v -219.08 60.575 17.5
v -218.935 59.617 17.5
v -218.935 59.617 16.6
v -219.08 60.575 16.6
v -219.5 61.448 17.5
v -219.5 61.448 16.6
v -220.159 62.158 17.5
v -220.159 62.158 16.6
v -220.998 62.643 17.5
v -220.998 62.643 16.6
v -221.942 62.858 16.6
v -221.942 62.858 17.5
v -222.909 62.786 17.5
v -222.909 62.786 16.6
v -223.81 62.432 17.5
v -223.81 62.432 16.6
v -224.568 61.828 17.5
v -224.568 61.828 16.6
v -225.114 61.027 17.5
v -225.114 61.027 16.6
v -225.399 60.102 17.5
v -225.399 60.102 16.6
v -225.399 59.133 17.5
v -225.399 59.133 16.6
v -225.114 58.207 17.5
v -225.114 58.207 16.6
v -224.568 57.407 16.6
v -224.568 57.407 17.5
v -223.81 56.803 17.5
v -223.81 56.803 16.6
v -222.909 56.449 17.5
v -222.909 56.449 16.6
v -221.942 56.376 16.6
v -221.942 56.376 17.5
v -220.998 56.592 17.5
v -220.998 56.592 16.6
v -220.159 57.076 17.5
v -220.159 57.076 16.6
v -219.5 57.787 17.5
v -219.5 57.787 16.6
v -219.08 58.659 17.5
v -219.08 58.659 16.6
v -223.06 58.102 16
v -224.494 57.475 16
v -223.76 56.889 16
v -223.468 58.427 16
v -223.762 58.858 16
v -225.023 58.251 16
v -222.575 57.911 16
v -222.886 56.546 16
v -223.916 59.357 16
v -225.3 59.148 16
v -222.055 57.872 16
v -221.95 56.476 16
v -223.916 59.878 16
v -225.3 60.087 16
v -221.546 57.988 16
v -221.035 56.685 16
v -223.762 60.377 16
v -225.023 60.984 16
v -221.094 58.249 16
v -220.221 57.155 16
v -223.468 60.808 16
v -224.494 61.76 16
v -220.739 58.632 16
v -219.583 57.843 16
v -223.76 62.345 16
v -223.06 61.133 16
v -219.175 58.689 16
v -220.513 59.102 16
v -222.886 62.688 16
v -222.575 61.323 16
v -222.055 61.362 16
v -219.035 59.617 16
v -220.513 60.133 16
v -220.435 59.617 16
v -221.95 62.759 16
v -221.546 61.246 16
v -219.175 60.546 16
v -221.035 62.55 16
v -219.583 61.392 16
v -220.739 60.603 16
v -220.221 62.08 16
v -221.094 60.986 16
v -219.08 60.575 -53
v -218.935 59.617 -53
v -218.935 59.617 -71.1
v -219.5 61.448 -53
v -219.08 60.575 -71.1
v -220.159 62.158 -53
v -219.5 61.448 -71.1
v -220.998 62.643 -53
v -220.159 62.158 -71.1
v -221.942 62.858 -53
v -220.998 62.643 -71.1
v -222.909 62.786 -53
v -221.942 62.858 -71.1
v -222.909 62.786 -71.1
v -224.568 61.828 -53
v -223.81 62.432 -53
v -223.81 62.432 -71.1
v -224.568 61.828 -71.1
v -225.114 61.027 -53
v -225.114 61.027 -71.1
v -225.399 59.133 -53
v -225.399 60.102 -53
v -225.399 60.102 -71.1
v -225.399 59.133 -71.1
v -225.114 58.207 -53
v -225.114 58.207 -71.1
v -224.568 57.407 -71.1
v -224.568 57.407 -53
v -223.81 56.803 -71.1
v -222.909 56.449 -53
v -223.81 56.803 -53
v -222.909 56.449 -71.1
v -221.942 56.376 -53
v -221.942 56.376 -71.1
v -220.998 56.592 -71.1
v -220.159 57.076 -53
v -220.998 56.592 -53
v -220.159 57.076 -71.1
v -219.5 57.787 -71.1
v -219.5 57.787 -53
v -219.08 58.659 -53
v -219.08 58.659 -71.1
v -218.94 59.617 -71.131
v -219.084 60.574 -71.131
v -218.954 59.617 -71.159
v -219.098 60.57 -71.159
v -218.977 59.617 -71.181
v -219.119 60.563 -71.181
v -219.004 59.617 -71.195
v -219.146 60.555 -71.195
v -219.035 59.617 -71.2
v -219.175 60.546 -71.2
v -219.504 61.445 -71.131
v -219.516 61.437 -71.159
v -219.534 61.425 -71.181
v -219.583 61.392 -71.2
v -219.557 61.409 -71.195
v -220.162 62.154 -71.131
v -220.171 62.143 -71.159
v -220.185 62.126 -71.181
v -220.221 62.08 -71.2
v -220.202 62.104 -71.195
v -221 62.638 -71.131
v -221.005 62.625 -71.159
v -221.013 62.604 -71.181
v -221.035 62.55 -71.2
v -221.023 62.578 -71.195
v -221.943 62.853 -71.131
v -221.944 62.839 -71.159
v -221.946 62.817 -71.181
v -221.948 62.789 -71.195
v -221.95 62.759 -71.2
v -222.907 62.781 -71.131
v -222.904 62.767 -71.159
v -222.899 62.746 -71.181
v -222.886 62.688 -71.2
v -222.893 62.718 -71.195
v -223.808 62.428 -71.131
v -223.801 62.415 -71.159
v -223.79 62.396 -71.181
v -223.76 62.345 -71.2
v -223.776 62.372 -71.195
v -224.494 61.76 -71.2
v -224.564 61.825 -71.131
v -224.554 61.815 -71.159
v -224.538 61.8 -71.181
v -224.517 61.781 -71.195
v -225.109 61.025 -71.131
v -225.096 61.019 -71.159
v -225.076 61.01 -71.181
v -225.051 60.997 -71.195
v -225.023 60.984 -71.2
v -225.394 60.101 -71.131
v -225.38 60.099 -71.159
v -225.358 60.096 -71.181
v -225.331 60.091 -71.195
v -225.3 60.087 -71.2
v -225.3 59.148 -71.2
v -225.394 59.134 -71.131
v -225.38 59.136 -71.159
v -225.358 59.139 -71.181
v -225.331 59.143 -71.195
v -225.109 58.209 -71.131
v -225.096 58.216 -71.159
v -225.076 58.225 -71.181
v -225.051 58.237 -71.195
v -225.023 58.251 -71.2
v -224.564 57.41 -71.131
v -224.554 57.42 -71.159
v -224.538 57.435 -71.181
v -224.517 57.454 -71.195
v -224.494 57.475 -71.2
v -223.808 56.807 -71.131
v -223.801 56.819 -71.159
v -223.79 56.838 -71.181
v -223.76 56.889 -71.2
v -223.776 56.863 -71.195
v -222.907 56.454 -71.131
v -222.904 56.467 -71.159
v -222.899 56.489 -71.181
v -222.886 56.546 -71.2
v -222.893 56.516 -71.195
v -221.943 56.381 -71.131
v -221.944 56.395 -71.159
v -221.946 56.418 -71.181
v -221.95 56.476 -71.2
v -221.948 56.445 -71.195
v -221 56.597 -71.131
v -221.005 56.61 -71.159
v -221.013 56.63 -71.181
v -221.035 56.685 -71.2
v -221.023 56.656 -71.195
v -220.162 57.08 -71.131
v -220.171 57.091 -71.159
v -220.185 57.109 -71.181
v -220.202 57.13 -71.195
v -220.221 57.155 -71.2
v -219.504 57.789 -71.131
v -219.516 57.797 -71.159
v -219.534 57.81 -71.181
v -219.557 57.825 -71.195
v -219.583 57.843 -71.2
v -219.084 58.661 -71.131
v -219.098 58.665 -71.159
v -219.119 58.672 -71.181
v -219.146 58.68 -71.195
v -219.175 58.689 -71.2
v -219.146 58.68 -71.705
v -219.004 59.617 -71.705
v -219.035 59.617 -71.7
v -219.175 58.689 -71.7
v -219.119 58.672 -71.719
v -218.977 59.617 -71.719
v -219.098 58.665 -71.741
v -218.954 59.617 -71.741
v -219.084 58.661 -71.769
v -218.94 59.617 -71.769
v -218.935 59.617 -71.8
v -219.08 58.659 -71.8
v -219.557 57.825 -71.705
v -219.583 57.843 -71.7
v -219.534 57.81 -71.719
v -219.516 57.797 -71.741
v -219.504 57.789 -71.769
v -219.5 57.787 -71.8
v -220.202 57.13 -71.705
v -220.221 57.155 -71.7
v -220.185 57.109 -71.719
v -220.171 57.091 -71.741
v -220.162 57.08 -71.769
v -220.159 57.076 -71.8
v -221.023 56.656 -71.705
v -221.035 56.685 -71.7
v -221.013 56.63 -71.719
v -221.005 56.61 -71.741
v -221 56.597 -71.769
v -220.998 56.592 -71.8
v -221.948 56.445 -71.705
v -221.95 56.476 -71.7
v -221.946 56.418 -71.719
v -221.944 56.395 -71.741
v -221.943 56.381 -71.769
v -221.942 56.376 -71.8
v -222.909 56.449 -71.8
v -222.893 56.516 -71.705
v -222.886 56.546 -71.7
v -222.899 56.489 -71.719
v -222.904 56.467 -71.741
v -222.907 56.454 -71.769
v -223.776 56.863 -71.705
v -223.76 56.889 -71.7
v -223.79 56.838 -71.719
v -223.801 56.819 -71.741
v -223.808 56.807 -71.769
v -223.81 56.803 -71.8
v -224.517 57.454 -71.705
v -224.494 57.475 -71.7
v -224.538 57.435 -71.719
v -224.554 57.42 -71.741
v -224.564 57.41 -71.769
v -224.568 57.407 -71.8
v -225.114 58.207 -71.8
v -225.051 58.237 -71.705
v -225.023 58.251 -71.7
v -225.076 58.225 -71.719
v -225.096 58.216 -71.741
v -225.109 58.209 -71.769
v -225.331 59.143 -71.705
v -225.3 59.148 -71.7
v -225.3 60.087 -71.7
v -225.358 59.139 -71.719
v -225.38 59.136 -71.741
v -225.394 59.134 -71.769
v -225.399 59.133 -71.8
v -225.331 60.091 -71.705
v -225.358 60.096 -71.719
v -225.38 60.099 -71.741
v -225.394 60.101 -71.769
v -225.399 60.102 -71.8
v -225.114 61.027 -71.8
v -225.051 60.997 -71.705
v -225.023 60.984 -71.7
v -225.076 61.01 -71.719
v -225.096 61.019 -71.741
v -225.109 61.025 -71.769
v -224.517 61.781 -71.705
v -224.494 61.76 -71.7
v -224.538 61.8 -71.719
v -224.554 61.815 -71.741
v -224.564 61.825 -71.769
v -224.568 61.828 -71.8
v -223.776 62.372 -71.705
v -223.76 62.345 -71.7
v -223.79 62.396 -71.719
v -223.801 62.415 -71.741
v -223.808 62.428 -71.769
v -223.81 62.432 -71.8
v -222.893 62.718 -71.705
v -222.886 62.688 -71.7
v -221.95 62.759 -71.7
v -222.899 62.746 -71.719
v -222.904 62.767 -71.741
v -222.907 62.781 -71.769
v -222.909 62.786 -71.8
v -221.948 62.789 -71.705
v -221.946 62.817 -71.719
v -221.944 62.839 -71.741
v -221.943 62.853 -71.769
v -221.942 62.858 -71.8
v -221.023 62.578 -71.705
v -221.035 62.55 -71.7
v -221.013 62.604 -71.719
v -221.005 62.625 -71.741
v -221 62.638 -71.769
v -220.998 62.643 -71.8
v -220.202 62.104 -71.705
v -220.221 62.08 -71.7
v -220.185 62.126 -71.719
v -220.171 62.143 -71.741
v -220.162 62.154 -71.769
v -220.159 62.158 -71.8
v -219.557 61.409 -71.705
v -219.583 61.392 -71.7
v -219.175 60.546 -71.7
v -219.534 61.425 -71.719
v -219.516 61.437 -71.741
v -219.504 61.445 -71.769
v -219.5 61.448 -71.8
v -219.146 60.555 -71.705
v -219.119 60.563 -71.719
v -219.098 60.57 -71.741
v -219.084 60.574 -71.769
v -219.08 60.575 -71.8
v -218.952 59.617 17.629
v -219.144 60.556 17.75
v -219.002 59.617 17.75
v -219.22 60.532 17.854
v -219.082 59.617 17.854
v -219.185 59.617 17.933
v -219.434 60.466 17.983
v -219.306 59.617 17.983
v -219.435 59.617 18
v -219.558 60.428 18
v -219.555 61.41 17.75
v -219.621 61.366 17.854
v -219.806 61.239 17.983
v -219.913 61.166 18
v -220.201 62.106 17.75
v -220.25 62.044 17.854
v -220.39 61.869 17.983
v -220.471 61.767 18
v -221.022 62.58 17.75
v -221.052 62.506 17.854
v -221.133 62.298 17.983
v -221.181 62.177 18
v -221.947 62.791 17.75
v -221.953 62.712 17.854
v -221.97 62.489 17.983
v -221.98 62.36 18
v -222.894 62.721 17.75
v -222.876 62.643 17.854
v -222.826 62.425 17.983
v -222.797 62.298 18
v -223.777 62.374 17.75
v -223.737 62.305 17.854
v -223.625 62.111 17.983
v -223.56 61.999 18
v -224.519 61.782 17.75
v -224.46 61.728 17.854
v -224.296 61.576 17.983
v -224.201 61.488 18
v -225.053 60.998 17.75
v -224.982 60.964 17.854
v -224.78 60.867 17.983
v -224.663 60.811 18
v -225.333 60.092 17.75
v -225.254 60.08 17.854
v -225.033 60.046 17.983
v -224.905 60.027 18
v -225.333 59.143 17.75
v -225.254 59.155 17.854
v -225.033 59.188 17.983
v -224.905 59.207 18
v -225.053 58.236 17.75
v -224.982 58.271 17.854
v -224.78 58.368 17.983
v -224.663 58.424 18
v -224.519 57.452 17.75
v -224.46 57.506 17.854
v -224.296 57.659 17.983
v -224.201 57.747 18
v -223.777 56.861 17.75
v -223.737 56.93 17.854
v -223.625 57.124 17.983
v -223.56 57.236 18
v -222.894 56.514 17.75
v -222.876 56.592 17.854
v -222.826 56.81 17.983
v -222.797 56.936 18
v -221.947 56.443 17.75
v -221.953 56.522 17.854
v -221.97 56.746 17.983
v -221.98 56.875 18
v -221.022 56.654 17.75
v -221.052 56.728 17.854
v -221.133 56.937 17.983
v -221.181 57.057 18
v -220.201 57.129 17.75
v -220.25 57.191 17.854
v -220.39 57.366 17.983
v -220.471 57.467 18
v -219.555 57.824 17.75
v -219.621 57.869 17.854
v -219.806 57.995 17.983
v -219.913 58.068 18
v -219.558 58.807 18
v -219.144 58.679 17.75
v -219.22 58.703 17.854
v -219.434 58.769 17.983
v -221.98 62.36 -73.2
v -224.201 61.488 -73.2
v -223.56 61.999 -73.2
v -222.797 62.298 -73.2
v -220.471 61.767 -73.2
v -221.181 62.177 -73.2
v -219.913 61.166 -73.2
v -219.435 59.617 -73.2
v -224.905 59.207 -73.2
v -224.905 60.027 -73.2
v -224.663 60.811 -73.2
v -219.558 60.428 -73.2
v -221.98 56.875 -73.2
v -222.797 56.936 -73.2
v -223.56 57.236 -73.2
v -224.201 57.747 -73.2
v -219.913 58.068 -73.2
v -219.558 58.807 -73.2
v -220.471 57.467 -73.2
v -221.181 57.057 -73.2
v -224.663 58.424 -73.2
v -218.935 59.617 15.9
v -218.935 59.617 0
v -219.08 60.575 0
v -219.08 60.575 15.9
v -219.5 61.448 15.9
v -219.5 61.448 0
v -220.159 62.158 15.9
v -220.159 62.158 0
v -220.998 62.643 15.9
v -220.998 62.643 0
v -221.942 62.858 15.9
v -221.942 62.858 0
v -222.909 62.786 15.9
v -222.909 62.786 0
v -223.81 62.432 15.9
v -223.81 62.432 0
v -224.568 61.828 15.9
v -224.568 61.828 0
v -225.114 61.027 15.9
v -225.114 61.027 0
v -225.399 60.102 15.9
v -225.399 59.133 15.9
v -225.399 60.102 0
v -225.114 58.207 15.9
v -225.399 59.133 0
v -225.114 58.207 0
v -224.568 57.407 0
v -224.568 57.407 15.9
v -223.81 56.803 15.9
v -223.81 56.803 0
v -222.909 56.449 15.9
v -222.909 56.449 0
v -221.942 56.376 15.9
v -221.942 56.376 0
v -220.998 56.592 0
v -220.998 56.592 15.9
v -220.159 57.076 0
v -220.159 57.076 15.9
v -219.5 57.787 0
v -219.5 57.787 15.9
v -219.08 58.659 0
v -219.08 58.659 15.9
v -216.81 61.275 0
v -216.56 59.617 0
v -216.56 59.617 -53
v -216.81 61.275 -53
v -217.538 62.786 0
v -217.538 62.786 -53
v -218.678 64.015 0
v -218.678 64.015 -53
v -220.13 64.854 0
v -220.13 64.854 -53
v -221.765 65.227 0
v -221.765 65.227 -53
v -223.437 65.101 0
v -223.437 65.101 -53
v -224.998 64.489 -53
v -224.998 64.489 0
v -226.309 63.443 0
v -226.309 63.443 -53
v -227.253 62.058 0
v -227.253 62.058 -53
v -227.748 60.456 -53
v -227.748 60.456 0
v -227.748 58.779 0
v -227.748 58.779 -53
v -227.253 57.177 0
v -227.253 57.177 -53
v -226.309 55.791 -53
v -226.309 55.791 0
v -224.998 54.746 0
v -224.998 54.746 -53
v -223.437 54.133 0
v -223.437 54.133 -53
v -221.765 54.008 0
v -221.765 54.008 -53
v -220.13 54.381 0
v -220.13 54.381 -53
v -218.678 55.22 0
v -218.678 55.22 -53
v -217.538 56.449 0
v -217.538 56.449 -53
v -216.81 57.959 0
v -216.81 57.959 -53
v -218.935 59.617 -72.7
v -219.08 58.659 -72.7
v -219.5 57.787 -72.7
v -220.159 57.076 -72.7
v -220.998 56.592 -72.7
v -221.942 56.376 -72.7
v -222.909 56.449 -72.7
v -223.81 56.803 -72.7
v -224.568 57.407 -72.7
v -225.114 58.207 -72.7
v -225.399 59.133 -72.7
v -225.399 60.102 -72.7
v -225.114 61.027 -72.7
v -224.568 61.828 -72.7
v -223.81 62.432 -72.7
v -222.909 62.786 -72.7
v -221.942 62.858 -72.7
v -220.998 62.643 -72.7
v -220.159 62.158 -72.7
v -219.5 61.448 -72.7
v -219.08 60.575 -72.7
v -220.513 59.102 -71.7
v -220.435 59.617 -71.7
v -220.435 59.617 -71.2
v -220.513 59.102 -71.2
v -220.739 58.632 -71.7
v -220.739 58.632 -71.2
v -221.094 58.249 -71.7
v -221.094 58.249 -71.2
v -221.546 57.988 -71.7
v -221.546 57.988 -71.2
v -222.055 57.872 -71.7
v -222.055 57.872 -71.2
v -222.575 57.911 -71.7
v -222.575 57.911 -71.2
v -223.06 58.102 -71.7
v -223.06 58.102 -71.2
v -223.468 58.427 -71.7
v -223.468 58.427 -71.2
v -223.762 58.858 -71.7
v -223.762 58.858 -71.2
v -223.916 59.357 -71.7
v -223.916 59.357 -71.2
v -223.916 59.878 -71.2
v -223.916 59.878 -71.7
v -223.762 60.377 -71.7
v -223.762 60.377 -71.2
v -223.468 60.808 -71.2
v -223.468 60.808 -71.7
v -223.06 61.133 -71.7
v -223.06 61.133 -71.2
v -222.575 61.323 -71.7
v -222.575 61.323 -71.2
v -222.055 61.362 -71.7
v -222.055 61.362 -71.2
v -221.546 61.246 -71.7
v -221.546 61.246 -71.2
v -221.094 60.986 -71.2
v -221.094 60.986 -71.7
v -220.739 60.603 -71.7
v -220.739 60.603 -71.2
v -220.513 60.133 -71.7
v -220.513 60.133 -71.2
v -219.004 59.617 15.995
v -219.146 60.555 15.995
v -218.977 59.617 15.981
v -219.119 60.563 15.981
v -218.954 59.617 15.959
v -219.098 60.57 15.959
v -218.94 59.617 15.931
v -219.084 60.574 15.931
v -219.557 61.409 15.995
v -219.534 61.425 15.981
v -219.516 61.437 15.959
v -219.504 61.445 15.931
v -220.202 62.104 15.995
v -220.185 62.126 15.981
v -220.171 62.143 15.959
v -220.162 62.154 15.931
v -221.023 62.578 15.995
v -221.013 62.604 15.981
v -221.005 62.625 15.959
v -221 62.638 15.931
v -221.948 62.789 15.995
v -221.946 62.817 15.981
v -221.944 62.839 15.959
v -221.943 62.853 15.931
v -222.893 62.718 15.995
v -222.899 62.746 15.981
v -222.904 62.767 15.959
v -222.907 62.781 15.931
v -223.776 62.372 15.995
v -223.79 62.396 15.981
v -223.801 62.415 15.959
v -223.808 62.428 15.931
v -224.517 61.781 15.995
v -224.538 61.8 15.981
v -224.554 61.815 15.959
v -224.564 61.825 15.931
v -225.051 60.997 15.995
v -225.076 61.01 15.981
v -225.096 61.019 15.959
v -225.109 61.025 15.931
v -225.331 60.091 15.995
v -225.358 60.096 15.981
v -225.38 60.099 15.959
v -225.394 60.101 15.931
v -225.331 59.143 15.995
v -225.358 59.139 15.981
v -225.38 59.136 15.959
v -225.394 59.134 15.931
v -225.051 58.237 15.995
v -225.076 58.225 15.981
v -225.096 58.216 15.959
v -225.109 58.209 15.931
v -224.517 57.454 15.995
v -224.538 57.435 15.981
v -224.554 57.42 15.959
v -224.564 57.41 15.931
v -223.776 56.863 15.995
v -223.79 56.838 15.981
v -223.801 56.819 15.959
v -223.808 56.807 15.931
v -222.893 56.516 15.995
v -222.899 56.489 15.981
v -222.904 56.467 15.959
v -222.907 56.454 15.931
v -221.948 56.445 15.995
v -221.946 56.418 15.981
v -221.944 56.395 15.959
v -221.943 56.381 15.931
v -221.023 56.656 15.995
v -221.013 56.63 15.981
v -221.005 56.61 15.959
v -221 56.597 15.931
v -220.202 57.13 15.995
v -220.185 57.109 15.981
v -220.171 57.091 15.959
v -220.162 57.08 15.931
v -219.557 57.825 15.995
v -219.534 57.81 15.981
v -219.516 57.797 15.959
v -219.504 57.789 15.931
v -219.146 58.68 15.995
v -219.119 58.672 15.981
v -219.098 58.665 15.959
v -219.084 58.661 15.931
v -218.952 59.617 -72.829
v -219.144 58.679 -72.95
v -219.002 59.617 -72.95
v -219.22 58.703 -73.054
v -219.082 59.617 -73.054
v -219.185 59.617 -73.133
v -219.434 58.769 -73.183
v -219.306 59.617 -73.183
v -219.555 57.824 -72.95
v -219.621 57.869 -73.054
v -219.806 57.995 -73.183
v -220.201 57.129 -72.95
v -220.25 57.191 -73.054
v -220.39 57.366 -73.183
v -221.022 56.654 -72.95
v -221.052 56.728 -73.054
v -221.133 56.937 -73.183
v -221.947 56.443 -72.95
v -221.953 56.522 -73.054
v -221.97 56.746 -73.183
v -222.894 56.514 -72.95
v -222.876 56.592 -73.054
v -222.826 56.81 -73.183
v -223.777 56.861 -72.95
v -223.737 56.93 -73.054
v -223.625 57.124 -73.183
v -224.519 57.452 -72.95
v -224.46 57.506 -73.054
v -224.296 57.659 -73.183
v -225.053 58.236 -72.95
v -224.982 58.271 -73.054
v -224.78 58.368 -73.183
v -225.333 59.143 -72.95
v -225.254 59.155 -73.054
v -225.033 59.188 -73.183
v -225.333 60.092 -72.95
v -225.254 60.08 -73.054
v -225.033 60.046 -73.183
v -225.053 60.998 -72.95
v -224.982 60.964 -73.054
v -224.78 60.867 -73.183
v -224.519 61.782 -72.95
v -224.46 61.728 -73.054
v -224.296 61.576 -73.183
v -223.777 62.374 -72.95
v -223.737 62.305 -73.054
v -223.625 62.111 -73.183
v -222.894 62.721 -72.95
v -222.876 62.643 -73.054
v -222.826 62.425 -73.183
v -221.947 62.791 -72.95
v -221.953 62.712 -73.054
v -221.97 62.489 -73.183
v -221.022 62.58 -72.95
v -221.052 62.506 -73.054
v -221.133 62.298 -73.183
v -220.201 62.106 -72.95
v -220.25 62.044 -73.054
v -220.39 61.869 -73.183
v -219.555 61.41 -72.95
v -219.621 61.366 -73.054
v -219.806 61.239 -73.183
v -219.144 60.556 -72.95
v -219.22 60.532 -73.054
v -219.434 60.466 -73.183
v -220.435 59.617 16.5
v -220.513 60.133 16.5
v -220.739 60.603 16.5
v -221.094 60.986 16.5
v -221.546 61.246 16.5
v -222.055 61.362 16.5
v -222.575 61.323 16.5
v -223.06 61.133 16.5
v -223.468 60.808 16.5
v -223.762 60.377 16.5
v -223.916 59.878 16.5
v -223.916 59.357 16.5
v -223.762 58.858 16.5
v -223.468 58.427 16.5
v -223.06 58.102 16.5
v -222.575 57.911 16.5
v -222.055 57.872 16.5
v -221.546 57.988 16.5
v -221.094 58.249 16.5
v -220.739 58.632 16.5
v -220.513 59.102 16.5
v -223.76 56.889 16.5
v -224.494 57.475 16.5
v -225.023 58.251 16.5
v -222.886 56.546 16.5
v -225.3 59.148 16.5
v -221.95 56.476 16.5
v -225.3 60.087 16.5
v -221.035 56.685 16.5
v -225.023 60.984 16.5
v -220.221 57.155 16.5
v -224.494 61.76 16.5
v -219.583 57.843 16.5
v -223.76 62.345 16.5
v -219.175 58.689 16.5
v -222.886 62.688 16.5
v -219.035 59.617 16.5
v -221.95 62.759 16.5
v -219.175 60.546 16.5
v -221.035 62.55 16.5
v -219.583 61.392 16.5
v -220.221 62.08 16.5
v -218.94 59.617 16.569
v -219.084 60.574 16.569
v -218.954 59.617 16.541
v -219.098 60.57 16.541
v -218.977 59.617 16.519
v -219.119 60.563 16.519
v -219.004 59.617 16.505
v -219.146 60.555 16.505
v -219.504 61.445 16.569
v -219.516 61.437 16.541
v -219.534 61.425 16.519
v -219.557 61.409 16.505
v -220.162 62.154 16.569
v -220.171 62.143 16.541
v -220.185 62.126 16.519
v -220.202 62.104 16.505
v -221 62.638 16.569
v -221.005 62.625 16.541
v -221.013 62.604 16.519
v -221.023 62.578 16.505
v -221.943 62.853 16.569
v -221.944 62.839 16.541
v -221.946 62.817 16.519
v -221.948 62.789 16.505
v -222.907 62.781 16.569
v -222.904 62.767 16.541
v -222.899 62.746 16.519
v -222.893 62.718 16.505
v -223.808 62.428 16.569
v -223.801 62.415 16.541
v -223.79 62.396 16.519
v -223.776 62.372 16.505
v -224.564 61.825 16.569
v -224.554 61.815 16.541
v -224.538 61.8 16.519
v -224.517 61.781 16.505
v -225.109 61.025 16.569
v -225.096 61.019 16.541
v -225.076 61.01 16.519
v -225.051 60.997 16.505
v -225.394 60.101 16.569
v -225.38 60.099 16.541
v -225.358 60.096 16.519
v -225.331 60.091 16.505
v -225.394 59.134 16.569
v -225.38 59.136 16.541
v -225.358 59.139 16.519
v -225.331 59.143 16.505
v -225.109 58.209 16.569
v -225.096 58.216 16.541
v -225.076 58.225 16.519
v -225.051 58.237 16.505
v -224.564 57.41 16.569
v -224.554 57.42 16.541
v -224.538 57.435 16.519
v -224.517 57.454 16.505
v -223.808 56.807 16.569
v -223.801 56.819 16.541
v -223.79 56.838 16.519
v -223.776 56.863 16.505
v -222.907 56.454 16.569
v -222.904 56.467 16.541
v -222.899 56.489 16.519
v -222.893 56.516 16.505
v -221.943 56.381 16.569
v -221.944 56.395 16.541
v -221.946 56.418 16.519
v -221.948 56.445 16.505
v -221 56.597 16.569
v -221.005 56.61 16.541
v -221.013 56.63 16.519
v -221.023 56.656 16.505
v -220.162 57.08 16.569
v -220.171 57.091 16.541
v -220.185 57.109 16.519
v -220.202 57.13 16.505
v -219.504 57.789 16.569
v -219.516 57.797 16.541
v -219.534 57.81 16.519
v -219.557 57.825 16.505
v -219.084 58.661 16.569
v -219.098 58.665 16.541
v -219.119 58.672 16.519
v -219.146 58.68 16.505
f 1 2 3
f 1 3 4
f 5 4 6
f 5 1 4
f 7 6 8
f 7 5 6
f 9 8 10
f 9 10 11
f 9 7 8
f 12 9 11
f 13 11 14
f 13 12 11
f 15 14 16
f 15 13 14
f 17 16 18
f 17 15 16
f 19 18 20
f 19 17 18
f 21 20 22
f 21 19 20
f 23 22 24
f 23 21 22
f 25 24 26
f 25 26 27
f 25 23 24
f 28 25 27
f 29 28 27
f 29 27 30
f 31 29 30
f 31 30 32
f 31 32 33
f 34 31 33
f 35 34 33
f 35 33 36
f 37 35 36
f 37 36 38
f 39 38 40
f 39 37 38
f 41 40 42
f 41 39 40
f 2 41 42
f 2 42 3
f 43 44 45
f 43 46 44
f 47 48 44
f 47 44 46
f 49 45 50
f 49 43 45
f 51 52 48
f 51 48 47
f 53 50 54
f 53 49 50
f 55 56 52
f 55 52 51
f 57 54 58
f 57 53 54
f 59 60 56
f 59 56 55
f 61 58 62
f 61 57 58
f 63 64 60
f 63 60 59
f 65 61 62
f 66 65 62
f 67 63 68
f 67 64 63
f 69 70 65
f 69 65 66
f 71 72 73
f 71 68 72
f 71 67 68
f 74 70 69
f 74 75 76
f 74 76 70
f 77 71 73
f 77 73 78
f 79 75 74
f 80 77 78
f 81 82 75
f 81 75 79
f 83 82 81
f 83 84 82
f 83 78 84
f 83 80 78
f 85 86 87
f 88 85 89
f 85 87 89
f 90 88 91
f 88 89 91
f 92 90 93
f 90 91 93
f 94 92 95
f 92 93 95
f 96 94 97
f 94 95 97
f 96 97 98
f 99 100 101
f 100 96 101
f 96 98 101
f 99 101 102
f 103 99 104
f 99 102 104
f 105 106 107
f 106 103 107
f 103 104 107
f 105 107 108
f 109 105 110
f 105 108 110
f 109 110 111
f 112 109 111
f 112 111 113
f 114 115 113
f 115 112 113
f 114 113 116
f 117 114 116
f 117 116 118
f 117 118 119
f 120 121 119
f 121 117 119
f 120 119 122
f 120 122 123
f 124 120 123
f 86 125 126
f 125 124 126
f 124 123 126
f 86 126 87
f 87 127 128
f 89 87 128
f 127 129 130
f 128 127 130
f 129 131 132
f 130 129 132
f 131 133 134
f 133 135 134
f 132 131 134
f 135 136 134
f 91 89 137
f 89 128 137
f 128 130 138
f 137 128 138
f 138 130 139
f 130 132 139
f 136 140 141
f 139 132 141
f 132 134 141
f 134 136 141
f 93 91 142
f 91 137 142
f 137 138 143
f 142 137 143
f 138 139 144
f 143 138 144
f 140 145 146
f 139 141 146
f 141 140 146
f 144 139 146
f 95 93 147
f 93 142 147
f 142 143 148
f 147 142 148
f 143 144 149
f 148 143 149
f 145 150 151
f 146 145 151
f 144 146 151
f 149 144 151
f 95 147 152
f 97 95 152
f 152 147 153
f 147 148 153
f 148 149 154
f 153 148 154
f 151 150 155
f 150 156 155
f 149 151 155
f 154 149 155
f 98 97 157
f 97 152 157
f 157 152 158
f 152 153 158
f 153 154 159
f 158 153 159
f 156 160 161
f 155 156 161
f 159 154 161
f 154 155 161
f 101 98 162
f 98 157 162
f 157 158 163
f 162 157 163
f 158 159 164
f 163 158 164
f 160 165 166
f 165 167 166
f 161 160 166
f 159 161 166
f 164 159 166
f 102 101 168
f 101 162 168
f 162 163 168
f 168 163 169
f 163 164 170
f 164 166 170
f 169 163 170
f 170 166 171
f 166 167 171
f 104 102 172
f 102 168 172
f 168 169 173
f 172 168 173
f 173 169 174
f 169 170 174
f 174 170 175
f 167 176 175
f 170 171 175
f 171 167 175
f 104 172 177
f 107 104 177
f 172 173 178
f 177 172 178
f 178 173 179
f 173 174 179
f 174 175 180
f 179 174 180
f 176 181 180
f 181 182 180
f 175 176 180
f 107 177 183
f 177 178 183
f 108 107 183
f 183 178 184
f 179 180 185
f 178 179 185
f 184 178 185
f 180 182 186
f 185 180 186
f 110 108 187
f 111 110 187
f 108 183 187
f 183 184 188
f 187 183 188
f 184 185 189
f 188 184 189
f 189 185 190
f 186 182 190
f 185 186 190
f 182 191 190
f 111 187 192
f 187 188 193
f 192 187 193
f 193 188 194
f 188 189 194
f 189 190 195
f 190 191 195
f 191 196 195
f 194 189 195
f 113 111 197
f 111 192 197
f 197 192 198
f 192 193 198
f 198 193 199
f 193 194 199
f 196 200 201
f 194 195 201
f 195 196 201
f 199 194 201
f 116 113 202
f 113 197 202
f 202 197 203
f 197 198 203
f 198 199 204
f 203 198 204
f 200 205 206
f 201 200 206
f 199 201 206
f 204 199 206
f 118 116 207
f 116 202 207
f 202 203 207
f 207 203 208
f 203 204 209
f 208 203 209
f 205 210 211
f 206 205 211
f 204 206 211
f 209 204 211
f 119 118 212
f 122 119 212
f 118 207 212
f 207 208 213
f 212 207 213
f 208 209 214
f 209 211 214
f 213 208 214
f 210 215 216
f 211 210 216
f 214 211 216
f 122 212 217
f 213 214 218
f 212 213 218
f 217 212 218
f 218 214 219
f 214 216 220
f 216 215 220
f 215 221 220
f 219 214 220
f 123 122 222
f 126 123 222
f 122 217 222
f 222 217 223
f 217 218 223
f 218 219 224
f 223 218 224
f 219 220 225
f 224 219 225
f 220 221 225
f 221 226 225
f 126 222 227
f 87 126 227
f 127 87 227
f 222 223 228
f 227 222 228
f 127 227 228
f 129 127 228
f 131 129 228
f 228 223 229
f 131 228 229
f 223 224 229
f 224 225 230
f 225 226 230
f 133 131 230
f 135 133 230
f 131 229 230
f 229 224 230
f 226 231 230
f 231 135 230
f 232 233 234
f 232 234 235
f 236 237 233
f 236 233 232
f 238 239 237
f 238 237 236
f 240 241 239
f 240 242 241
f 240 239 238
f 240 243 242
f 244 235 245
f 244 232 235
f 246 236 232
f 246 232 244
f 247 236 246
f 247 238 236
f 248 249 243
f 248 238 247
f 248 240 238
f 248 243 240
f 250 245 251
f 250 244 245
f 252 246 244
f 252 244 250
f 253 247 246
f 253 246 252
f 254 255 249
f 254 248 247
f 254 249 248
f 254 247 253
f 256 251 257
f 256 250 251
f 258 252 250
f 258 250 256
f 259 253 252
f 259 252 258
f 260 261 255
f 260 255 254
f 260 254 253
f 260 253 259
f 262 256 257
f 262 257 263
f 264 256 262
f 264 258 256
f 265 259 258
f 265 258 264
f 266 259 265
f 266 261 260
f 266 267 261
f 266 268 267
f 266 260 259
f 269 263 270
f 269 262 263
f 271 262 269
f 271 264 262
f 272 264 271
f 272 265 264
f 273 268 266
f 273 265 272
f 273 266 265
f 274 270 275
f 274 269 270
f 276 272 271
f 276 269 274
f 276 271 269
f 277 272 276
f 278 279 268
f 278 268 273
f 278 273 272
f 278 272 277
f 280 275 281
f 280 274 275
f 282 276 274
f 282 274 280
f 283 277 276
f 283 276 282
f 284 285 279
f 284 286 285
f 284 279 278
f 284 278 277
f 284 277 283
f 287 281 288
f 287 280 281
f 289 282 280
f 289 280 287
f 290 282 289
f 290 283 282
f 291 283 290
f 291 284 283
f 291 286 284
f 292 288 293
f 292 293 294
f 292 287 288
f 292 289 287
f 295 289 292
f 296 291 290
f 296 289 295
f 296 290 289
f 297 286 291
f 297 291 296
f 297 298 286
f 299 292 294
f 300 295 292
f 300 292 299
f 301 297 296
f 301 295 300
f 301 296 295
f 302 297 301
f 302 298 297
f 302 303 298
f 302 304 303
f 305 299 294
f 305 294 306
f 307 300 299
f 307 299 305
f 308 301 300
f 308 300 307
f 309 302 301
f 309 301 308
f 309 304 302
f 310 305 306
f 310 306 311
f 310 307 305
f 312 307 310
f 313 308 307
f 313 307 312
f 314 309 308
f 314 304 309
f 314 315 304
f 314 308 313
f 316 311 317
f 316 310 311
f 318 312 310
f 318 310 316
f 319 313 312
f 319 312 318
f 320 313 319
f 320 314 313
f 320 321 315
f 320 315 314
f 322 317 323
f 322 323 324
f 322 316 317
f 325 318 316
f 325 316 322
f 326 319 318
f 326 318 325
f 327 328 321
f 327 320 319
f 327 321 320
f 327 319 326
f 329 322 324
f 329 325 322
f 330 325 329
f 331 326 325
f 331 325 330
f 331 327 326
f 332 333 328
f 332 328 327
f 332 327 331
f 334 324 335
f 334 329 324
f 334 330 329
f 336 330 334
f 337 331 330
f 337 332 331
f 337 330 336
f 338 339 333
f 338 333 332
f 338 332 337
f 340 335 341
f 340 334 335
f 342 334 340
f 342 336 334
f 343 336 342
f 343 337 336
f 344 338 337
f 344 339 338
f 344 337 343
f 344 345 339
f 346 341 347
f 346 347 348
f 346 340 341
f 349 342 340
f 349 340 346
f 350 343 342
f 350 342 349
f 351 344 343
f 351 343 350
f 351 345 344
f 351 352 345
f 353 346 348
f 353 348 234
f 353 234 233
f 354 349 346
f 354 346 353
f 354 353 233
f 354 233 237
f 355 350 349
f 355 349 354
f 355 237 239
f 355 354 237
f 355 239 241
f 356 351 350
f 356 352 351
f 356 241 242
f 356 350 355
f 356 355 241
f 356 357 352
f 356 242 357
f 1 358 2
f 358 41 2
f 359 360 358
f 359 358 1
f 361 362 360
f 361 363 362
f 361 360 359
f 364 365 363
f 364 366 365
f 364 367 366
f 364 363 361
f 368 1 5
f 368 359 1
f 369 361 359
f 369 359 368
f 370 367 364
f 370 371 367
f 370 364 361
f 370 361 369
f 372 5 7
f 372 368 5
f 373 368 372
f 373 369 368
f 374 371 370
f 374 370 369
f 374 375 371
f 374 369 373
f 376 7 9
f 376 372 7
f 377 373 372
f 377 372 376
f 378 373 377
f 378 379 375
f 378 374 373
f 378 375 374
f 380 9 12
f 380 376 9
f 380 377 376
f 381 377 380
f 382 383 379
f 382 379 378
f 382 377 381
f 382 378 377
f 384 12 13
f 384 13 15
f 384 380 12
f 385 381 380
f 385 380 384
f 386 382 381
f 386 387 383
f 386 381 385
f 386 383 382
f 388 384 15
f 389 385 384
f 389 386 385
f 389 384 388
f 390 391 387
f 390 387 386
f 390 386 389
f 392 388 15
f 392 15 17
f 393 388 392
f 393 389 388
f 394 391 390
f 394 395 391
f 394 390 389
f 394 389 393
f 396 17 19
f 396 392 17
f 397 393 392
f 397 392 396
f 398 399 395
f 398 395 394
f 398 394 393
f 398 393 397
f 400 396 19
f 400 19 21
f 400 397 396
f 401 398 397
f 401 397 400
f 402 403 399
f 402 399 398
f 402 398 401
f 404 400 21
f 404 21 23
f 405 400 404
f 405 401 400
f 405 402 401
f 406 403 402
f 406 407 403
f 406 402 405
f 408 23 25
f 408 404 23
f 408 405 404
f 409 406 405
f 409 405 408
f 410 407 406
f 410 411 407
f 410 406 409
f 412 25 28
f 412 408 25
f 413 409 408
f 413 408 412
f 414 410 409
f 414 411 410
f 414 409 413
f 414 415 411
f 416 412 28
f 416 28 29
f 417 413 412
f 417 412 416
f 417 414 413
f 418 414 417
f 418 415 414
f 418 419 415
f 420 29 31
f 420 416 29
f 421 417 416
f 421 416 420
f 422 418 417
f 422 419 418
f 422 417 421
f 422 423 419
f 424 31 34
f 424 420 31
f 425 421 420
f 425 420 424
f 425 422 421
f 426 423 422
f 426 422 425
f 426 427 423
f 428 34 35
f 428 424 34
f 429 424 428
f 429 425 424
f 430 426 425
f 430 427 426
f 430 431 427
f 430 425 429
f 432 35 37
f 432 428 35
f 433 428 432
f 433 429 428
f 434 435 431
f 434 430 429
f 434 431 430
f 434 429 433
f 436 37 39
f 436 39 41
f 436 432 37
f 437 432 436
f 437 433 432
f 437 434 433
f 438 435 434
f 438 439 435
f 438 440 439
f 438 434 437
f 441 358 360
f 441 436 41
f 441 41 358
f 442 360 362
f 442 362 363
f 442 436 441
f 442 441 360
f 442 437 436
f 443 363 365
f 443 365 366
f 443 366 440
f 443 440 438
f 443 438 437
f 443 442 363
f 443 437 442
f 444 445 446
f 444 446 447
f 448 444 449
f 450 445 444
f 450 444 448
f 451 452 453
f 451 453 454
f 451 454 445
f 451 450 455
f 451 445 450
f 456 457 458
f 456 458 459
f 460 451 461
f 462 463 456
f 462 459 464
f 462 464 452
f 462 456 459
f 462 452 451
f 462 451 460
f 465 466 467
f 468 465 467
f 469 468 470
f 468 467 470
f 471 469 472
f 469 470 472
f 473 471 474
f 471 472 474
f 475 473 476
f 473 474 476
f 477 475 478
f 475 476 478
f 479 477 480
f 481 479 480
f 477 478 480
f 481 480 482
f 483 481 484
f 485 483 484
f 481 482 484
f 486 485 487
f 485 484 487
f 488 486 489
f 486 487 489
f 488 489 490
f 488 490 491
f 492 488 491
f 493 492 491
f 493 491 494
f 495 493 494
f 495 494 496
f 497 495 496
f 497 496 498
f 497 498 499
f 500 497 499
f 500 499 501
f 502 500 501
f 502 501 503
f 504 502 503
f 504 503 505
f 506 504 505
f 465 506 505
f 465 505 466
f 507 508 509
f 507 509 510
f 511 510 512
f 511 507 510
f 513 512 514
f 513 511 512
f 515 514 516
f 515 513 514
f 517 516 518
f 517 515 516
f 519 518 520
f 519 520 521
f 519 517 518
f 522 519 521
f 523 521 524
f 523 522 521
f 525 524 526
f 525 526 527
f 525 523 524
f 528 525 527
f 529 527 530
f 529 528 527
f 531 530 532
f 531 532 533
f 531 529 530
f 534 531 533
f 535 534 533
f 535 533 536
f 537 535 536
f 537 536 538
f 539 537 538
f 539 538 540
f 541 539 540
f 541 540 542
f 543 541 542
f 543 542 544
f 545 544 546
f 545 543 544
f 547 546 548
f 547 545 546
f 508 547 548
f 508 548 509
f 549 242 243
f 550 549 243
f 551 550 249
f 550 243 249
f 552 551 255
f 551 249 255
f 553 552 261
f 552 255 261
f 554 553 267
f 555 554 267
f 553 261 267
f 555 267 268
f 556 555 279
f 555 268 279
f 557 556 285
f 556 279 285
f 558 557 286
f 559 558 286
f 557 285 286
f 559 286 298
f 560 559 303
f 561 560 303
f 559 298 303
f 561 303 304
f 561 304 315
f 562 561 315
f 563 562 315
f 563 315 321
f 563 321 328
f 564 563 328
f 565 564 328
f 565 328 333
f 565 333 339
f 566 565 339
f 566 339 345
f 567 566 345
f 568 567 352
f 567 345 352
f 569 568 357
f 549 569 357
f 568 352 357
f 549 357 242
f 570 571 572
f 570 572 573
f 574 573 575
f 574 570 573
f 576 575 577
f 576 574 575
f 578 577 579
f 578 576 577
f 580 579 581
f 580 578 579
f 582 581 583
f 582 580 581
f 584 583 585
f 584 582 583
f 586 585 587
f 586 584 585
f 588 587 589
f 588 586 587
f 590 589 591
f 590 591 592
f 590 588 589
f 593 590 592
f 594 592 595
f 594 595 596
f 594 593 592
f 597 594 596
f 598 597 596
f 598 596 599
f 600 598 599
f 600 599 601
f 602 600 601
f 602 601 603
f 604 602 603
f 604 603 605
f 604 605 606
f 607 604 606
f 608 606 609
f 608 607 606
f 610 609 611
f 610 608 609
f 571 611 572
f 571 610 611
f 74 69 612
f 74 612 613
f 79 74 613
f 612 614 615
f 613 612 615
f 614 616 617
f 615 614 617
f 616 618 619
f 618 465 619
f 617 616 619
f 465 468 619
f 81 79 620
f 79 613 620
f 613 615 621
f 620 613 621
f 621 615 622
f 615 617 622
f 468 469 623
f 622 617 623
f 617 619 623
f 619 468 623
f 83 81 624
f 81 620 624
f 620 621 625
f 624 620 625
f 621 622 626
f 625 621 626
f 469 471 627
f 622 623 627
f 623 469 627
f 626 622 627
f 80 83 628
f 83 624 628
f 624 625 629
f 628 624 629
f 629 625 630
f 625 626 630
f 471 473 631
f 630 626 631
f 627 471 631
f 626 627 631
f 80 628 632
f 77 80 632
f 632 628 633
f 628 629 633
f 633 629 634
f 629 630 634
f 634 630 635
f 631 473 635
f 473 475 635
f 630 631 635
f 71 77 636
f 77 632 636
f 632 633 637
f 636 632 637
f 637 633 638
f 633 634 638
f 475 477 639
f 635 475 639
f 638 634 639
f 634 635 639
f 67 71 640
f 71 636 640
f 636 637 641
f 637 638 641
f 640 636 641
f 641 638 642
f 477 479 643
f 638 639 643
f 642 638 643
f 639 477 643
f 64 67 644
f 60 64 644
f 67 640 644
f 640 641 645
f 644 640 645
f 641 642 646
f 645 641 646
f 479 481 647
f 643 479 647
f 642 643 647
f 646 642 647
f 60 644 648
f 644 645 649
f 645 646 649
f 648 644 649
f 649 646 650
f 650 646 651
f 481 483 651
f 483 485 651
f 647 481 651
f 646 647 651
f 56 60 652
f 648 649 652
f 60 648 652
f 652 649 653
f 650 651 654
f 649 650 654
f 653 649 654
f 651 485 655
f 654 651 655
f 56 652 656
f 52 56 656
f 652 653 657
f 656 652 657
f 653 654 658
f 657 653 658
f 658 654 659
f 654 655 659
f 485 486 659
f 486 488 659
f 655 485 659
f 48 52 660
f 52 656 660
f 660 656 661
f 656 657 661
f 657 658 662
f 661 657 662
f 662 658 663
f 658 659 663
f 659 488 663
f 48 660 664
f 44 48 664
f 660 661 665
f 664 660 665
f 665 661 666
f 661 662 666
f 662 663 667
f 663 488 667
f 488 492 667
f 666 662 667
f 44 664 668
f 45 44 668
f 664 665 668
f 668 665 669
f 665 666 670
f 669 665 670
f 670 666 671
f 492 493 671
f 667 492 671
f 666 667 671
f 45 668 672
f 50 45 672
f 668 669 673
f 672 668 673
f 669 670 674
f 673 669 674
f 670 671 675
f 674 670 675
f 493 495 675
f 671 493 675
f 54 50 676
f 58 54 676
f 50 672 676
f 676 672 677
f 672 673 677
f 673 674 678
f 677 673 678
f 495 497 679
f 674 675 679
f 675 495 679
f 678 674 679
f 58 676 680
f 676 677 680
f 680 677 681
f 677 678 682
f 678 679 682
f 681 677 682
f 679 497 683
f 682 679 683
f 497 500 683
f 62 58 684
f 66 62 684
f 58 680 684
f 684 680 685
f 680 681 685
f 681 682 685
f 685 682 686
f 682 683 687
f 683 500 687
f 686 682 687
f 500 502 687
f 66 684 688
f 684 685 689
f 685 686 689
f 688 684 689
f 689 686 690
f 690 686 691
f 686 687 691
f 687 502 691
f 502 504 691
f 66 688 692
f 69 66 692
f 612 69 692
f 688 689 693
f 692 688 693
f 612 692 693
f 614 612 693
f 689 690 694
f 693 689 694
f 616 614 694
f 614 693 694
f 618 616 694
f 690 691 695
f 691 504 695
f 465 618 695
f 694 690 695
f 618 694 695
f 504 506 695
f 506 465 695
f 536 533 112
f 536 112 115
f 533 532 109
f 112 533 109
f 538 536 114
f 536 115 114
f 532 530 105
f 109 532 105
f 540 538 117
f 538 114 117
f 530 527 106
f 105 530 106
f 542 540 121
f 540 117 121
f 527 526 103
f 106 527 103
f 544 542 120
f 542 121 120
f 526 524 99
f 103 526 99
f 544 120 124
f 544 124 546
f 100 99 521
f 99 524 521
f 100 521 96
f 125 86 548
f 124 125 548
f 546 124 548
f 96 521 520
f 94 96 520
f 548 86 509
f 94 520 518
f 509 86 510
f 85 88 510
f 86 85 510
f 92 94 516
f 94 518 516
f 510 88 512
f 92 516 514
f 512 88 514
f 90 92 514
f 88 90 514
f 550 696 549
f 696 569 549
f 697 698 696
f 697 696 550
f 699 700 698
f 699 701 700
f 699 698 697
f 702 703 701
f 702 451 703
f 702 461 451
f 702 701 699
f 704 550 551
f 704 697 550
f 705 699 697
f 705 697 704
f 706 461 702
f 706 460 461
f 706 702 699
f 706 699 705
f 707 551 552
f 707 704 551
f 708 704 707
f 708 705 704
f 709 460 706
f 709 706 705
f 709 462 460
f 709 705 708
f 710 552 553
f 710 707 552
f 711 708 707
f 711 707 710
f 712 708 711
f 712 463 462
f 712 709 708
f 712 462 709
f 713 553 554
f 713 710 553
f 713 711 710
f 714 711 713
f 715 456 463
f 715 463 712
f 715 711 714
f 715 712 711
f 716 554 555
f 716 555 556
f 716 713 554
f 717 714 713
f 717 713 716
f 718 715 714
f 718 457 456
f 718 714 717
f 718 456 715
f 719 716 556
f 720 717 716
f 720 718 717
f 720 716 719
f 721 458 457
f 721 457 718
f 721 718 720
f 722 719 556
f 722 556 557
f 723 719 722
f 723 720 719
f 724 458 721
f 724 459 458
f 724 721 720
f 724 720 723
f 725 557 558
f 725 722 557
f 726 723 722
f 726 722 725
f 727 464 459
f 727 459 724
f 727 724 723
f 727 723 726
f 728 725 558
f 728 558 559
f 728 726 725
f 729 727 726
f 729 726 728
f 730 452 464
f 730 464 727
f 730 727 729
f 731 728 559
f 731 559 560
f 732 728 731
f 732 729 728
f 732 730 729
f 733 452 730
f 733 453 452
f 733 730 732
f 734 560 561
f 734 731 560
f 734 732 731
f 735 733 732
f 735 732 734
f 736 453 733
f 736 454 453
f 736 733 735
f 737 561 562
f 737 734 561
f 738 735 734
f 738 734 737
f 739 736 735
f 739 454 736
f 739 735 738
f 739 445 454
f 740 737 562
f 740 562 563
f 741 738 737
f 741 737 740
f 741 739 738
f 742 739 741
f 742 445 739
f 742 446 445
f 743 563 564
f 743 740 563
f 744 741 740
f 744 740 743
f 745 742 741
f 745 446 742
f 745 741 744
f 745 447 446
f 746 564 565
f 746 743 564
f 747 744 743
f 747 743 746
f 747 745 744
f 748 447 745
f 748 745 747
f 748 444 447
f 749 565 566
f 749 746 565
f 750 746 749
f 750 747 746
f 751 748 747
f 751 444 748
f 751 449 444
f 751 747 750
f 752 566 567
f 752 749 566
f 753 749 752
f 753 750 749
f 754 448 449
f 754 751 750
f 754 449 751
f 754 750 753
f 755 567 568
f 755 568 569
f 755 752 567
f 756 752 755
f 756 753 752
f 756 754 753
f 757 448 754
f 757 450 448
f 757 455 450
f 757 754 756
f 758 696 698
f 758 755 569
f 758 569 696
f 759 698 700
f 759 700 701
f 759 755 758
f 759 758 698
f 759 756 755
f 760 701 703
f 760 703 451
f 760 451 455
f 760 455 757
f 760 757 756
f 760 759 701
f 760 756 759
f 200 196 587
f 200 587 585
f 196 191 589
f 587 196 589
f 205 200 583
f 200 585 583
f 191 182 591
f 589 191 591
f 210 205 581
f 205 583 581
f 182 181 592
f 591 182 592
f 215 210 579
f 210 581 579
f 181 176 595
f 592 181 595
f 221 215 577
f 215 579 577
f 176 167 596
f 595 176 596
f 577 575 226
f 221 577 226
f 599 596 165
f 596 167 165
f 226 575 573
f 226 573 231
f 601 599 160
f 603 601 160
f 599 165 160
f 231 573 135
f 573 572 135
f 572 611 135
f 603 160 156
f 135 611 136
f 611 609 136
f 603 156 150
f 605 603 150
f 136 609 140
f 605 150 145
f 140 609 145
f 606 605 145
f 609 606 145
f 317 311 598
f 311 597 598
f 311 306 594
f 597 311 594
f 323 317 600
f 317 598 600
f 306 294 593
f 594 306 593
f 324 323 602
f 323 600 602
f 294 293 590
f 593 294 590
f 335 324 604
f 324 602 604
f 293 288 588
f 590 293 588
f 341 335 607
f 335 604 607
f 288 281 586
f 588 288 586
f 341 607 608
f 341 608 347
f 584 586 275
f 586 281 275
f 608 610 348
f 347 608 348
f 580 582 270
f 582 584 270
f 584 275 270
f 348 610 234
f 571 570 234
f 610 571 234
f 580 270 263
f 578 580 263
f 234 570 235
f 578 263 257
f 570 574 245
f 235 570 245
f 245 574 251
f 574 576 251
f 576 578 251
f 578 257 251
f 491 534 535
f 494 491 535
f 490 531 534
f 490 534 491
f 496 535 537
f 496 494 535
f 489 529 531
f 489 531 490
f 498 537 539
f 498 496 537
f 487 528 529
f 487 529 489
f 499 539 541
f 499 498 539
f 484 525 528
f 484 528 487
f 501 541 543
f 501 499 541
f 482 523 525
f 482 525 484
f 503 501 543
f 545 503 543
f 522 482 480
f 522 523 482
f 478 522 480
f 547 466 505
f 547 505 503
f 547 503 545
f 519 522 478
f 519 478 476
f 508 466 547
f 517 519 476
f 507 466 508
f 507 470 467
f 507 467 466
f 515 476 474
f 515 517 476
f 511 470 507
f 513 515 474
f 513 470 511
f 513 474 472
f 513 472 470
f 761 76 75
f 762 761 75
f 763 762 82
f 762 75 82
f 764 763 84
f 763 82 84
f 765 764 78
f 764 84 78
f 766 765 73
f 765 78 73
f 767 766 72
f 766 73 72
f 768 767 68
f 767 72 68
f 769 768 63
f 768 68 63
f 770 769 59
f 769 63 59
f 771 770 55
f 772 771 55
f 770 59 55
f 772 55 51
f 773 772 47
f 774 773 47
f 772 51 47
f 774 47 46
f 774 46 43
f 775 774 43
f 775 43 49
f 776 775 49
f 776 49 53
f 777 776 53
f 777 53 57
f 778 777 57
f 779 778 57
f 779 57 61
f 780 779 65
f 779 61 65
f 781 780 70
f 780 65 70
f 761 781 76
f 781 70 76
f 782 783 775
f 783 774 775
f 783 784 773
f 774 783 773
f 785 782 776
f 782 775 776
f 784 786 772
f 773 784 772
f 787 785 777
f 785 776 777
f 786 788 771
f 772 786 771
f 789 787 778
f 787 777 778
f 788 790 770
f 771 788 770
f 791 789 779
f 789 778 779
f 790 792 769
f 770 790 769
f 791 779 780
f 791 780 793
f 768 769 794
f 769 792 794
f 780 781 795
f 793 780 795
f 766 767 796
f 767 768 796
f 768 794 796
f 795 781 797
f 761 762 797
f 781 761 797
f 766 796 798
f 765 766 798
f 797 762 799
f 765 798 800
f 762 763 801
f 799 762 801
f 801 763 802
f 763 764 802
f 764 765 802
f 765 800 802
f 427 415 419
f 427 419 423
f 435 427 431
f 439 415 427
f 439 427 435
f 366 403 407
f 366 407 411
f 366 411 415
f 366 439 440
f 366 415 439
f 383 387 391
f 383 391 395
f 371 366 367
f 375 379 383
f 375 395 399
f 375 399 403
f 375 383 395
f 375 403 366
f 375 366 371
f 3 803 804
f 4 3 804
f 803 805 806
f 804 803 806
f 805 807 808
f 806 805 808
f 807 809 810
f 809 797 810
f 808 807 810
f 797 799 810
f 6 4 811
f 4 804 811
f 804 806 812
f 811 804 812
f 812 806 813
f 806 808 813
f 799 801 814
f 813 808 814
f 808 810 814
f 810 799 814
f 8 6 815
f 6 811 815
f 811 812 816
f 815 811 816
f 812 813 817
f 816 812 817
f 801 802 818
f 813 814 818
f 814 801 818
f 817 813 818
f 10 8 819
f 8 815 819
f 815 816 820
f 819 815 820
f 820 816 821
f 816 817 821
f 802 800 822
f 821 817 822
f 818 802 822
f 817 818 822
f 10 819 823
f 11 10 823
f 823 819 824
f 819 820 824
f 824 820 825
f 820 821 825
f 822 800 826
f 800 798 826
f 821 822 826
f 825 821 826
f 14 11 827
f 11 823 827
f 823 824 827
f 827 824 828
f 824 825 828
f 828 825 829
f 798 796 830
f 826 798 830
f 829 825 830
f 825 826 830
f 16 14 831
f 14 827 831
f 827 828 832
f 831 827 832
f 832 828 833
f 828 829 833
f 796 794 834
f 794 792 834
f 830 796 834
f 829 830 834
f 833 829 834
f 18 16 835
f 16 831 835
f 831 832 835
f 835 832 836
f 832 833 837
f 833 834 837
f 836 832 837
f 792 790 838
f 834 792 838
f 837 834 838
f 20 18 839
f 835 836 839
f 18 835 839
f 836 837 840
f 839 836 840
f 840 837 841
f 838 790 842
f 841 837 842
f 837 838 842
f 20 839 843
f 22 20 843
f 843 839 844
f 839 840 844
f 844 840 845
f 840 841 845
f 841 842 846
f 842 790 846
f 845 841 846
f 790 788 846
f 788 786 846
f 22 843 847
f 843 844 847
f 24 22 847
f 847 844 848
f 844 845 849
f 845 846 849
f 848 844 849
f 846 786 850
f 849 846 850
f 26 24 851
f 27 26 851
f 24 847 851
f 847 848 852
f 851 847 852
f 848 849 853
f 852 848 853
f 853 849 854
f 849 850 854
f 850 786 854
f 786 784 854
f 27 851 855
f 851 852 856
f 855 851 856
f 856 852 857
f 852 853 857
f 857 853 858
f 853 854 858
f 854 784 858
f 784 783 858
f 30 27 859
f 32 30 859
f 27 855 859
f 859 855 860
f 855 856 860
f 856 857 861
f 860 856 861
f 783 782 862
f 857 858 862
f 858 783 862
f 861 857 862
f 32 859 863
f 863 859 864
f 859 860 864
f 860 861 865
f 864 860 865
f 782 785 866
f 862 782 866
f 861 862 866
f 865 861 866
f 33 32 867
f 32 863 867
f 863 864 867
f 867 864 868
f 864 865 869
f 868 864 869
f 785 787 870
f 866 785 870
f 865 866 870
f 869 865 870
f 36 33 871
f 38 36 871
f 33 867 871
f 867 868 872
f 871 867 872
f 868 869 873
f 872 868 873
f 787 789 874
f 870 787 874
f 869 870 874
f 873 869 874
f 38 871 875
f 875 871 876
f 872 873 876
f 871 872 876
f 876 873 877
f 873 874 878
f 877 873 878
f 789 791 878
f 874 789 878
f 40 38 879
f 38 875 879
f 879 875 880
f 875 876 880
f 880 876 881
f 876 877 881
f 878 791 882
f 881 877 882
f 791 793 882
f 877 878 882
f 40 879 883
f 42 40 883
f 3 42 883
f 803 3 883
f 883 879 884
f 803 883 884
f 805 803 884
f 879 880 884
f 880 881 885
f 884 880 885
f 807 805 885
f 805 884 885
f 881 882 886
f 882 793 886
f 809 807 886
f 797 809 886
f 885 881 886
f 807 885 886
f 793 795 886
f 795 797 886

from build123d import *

# Parameters (mm, degrees)
SKETCH1_R                = 5.625
BOSS_EXTRUDE1_DEPTH      = 53
BOSS_EXTRUDE2_DEPTH      = 16
BOSS_EXTRUDE2_DEPTH_BACK = 71.2
SKETCH2_R                = 3.25
SKETCH3_R                = 1.75
BOSS_EXTRUDE3_DEPTH      = 0.5
BOSS_EXTRUDE4_START      = 0.5
SKETCH4_R                = 1.75
BOSS_EXTRUDE4_DEPTH      = 0.5
SKETCH5_R                = 3.25
BOSS_EXTRUDE5_DEPTH      = 1.5
BOSS_EXTRUDE6_START      = 1.5
SKETCH6_R                = 3.25
BOSS_EXTRUDE6_DEPTH      = 1.5
FILLET1_R                = 0.1
FILLET2_R                = 0.5


with BuildPart() as part:
    # Sketch1 → Boss-Extrude1 (new body)
    with BuildSketch(Plane.XY):
        with Locations((-222.185360959, 59.617346216)):
            Circle(SKETCH1_R)
    extrude(amount=-BOSS_EXTRUDE1_DEPTH)

    # Sketch2 → Boss-Extrude2 (add, two sides: drawn at the far end of the back side and taken through both)
    with BuildSketch(Plane.XY.offset(-BOSS_EXTRUDE2_DEPTH_BACK)):
        with Locations((-222.185360959, 59.617346216)):
            Circle(SKETCH2_R)
    extrude(amount=BOSS_EXTRUDE2_DEPTH + BOSS_EXTRUDE2_DEPTH_BACK)

    # Sketch3 → Boss-Extrude3 (add)
    with BuildSketch(Plane.XY.offset(16)):
        with Locations((-222.185360959, 59.617346216)):
            Circle(SKETCH3_R)
    extrude(amount=BOSS_EXTRUDE3_DEPTH)

    # Sketch4 → Boss-Extrude4 (add)
    with BuildSketch(Plane(origin=(0, 0, -71.2), x_dir=(-1, 0, 0), z_dir=(0, 0, -1)).offset(BOSS_EXTRUDE4_START)):
        with Locations(Location((222.185360959, 59.617346216, 0), (0, 0, 180))):
            Circle(SKETCH4_R)
    extrude(amount=-BOSS_EXTRUDE4_DEPTH)

    # Sketch5 → Boss-Extrude5 (add)
    with BuildSketch(Plane(origin=(0, 0, -71.7), x_dir=(-1, 0, 0), z_dir=(0, 0, -1))):
        with Locations(Location((222.185360959, 59.617346216, 0), (0, 0, 180))):
            Circle(SKETCH5_R)
    extrude(amount=BOSS_EXTRUDE5_DEPTH)

    # Sketch6 → Boss-Extrude6 (add)
    with BuildSketch(Plane.XY.offset(16.5).offset(BOSS_EXTRUDE6_START)):
        with Locations((-222.185360959, 59.617346216)):
            Circle(SKETCH6_R)
    extrude(amount=-BOSS_EXTRUDE6_DEPTH)

    # Fillet1
    fillet1_edges = [part.edges().sort_by_distance(p)[0] for p in [
        (-225.435360959, 59.617346216, -71.7),
        (-225.435360959, 59.617346216, 16.5),
        (-225.435360959, 59.617346216, -71.2),
        (-225.435360959, 59.617346216, 16),
    ]]
    fillet(fillet1_edges, radius=FILLET1_R)

    # Fillet2
    fillet2_edges = [part.edges().sort_by_distance(p)[0] for p in [
        (-225.435360959, 59.617346216, -73.2),
        (-225.435360959, 59.617346216, 18),
    ]]
    fillet(fillet2_edges, radius=FILLET2_R)


solid = part.part
